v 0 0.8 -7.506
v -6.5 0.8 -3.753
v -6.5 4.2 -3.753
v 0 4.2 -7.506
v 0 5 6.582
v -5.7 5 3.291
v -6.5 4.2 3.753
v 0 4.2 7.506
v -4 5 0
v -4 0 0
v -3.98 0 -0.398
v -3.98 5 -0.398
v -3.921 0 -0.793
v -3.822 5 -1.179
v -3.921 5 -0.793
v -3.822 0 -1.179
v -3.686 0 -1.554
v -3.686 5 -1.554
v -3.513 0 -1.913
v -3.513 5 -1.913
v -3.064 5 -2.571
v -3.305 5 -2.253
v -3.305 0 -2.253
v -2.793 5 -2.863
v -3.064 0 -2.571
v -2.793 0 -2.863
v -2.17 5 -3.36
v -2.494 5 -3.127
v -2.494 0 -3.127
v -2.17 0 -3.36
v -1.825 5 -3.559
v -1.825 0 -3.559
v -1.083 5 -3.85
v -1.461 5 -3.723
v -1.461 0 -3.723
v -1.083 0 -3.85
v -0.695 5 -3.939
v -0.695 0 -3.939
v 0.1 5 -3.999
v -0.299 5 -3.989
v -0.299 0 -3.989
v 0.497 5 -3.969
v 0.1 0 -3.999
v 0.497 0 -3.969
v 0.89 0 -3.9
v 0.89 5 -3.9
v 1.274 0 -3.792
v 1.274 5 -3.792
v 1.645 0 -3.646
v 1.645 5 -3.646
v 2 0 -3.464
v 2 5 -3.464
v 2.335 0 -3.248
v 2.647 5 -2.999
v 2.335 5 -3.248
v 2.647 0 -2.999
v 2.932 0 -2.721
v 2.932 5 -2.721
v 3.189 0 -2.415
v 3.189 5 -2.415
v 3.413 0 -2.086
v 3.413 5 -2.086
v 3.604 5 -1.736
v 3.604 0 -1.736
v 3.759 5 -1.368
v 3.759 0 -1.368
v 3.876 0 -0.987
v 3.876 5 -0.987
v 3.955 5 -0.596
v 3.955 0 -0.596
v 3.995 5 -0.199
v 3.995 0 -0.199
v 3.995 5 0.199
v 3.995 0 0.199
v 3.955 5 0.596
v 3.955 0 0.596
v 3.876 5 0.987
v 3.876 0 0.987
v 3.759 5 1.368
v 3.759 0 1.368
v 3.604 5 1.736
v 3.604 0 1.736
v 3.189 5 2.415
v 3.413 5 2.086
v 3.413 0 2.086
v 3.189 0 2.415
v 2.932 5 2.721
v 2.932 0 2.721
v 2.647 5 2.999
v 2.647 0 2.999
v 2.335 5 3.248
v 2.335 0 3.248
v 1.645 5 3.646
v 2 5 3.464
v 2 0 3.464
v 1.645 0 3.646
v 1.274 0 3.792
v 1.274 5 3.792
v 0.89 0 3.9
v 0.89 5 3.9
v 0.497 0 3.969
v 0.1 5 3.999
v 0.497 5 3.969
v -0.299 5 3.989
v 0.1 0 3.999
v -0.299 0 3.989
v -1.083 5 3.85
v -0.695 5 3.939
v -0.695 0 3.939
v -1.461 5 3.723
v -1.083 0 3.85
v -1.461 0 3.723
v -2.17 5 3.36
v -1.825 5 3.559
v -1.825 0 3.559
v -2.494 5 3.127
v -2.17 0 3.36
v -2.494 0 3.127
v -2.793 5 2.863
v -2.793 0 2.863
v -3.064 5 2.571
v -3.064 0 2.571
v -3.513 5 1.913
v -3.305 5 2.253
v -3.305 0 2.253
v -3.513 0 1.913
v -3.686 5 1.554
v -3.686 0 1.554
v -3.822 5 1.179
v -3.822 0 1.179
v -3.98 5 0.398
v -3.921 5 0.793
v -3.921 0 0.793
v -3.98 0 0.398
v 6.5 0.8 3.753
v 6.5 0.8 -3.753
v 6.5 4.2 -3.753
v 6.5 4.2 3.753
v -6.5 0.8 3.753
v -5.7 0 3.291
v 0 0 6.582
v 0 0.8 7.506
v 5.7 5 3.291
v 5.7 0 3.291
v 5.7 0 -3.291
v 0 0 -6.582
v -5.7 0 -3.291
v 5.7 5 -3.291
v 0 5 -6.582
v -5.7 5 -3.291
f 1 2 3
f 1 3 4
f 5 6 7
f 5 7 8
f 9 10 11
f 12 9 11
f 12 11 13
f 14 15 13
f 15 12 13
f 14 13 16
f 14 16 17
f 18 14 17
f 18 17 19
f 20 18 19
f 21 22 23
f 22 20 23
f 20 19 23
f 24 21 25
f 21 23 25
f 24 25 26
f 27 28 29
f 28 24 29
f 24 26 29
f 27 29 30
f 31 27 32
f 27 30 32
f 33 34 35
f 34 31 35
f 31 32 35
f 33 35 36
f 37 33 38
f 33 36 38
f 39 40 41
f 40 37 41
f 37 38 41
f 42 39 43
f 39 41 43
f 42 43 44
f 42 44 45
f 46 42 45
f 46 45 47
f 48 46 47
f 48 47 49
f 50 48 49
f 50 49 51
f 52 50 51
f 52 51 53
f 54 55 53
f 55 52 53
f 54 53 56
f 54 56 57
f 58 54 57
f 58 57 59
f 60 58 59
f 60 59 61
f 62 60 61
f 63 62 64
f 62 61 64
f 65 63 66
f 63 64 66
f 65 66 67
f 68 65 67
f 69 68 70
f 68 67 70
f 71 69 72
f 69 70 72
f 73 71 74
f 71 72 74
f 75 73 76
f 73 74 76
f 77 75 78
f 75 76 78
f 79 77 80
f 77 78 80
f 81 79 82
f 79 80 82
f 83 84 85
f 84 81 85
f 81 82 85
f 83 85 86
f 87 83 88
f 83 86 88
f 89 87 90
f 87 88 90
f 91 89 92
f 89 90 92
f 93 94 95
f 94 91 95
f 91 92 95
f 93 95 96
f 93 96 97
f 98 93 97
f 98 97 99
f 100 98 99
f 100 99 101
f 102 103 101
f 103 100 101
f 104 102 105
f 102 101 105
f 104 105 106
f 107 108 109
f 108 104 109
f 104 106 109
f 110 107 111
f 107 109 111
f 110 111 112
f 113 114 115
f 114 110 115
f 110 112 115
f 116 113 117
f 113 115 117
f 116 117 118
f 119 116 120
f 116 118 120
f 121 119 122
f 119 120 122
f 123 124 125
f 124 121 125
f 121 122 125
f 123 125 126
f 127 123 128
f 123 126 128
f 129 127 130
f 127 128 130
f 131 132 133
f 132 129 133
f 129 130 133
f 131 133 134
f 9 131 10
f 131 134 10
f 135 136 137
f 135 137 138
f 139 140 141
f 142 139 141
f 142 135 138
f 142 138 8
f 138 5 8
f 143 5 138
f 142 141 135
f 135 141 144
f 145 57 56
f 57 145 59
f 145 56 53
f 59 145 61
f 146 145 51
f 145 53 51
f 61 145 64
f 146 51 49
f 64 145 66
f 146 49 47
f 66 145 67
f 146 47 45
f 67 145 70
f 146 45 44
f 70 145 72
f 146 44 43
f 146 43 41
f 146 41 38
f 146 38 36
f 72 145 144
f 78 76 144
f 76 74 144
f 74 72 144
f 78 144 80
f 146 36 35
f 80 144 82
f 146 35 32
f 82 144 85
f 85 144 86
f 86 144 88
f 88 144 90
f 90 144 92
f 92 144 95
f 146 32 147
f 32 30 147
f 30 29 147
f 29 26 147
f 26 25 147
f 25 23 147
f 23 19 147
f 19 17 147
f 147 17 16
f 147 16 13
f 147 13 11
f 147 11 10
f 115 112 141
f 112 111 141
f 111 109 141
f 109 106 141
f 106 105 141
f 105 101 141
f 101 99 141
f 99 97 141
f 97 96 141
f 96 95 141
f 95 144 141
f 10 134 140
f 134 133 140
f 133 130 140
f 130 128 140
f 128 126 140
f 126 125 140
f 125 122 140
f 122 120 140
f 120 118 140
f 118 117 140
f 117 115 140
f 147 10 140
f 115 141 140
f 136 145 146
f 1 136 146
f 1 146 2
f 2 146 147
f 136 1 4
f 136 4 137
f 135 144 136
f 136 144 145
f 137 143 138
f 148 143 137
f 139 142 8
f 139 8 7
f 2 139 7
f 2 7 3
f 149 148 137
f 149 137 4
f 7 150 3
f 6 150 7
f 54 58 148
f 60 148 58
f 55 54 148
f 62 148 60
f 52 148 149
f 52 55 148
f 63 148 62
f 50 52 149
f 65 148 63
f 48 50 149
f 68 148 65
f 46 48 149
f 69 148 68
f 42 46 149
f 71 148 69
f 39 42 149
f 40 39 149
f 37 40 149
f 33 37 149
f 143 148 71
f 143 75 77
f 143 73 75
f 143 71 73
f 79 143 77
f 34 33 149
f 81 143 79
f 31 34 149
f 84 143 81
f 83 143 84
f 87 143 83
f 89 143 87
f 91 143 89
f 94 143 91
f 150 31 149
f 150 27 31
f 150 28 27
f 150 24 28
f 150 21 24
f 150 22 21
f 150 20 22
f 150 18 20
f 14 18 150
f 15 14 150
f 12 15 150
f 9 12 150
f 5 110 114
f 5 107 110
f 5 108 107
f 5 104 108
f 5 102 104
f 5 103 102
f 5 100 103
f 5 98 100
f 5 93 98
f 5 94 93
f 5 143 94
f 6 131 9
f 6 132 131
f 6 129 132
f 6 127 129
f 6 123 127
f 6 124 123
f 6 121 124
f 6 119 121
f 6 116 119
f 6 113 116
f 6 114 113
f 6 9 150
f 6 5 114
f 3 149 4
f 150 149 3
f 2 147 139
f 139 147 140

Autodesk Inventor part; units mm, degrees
ref_plane "YZ Plane" through (0, 0, 0) normal (1, 0, 0) x (0, 1, 0)
ref_plane "XZ Plane" through (0, 0, 0) normal (0, 1, 0) x (-1, 0, 0)
ref_plane "XY Plane" through (0, 0, 0) normal (0, 0, 1) x (1, 0, 0)
sketch "Sketch1" plane through (0, 0, 0) normal (0, 1, 0) x (-1, 0, 0)
  line L0 (6.5, -3.7528) -> (0, -7.5056)
  line L1 (0, -7.5056) -> (-6.5, -3.7528)
  line L2 (-6.5, -3.7528) -> (-6.5, 3.7528)
  line L3 (-6.5, 3.7528) -> (0, 7.5056)
  line L4 (0, 7.5056) -> (6.5, 3.7528)
  line L5 (6.5, 3.7528) -> (6.5, -3.7528)
  circle A0 centre (0, 0) radius 4
  point P0 (6.5, 0)
  dimension "d0" = 13
  dimension "d3" = 8
extrude "Extrusion1" add sketch "Sketch1" along normal blind 5
chamfer "Chamfer1" distance 0.8 angle 45 12 edges at (-3.25, 5, 5.6292) (-6.5, 5, 0) (-3.25, 5, -5.6292) (3.25, 5, -5.6292) (6.5, 5, 0) (3.25, 5, 5.6292) (-3.25, 0, 5.6292) (3.25, 0, 5.6292) (6.5, 0, 0) (3.25, 0, -5.6292) (-3.25, 0, -5.6292) (-6.5, 0, 0)
properties part number "M8_Nut"
